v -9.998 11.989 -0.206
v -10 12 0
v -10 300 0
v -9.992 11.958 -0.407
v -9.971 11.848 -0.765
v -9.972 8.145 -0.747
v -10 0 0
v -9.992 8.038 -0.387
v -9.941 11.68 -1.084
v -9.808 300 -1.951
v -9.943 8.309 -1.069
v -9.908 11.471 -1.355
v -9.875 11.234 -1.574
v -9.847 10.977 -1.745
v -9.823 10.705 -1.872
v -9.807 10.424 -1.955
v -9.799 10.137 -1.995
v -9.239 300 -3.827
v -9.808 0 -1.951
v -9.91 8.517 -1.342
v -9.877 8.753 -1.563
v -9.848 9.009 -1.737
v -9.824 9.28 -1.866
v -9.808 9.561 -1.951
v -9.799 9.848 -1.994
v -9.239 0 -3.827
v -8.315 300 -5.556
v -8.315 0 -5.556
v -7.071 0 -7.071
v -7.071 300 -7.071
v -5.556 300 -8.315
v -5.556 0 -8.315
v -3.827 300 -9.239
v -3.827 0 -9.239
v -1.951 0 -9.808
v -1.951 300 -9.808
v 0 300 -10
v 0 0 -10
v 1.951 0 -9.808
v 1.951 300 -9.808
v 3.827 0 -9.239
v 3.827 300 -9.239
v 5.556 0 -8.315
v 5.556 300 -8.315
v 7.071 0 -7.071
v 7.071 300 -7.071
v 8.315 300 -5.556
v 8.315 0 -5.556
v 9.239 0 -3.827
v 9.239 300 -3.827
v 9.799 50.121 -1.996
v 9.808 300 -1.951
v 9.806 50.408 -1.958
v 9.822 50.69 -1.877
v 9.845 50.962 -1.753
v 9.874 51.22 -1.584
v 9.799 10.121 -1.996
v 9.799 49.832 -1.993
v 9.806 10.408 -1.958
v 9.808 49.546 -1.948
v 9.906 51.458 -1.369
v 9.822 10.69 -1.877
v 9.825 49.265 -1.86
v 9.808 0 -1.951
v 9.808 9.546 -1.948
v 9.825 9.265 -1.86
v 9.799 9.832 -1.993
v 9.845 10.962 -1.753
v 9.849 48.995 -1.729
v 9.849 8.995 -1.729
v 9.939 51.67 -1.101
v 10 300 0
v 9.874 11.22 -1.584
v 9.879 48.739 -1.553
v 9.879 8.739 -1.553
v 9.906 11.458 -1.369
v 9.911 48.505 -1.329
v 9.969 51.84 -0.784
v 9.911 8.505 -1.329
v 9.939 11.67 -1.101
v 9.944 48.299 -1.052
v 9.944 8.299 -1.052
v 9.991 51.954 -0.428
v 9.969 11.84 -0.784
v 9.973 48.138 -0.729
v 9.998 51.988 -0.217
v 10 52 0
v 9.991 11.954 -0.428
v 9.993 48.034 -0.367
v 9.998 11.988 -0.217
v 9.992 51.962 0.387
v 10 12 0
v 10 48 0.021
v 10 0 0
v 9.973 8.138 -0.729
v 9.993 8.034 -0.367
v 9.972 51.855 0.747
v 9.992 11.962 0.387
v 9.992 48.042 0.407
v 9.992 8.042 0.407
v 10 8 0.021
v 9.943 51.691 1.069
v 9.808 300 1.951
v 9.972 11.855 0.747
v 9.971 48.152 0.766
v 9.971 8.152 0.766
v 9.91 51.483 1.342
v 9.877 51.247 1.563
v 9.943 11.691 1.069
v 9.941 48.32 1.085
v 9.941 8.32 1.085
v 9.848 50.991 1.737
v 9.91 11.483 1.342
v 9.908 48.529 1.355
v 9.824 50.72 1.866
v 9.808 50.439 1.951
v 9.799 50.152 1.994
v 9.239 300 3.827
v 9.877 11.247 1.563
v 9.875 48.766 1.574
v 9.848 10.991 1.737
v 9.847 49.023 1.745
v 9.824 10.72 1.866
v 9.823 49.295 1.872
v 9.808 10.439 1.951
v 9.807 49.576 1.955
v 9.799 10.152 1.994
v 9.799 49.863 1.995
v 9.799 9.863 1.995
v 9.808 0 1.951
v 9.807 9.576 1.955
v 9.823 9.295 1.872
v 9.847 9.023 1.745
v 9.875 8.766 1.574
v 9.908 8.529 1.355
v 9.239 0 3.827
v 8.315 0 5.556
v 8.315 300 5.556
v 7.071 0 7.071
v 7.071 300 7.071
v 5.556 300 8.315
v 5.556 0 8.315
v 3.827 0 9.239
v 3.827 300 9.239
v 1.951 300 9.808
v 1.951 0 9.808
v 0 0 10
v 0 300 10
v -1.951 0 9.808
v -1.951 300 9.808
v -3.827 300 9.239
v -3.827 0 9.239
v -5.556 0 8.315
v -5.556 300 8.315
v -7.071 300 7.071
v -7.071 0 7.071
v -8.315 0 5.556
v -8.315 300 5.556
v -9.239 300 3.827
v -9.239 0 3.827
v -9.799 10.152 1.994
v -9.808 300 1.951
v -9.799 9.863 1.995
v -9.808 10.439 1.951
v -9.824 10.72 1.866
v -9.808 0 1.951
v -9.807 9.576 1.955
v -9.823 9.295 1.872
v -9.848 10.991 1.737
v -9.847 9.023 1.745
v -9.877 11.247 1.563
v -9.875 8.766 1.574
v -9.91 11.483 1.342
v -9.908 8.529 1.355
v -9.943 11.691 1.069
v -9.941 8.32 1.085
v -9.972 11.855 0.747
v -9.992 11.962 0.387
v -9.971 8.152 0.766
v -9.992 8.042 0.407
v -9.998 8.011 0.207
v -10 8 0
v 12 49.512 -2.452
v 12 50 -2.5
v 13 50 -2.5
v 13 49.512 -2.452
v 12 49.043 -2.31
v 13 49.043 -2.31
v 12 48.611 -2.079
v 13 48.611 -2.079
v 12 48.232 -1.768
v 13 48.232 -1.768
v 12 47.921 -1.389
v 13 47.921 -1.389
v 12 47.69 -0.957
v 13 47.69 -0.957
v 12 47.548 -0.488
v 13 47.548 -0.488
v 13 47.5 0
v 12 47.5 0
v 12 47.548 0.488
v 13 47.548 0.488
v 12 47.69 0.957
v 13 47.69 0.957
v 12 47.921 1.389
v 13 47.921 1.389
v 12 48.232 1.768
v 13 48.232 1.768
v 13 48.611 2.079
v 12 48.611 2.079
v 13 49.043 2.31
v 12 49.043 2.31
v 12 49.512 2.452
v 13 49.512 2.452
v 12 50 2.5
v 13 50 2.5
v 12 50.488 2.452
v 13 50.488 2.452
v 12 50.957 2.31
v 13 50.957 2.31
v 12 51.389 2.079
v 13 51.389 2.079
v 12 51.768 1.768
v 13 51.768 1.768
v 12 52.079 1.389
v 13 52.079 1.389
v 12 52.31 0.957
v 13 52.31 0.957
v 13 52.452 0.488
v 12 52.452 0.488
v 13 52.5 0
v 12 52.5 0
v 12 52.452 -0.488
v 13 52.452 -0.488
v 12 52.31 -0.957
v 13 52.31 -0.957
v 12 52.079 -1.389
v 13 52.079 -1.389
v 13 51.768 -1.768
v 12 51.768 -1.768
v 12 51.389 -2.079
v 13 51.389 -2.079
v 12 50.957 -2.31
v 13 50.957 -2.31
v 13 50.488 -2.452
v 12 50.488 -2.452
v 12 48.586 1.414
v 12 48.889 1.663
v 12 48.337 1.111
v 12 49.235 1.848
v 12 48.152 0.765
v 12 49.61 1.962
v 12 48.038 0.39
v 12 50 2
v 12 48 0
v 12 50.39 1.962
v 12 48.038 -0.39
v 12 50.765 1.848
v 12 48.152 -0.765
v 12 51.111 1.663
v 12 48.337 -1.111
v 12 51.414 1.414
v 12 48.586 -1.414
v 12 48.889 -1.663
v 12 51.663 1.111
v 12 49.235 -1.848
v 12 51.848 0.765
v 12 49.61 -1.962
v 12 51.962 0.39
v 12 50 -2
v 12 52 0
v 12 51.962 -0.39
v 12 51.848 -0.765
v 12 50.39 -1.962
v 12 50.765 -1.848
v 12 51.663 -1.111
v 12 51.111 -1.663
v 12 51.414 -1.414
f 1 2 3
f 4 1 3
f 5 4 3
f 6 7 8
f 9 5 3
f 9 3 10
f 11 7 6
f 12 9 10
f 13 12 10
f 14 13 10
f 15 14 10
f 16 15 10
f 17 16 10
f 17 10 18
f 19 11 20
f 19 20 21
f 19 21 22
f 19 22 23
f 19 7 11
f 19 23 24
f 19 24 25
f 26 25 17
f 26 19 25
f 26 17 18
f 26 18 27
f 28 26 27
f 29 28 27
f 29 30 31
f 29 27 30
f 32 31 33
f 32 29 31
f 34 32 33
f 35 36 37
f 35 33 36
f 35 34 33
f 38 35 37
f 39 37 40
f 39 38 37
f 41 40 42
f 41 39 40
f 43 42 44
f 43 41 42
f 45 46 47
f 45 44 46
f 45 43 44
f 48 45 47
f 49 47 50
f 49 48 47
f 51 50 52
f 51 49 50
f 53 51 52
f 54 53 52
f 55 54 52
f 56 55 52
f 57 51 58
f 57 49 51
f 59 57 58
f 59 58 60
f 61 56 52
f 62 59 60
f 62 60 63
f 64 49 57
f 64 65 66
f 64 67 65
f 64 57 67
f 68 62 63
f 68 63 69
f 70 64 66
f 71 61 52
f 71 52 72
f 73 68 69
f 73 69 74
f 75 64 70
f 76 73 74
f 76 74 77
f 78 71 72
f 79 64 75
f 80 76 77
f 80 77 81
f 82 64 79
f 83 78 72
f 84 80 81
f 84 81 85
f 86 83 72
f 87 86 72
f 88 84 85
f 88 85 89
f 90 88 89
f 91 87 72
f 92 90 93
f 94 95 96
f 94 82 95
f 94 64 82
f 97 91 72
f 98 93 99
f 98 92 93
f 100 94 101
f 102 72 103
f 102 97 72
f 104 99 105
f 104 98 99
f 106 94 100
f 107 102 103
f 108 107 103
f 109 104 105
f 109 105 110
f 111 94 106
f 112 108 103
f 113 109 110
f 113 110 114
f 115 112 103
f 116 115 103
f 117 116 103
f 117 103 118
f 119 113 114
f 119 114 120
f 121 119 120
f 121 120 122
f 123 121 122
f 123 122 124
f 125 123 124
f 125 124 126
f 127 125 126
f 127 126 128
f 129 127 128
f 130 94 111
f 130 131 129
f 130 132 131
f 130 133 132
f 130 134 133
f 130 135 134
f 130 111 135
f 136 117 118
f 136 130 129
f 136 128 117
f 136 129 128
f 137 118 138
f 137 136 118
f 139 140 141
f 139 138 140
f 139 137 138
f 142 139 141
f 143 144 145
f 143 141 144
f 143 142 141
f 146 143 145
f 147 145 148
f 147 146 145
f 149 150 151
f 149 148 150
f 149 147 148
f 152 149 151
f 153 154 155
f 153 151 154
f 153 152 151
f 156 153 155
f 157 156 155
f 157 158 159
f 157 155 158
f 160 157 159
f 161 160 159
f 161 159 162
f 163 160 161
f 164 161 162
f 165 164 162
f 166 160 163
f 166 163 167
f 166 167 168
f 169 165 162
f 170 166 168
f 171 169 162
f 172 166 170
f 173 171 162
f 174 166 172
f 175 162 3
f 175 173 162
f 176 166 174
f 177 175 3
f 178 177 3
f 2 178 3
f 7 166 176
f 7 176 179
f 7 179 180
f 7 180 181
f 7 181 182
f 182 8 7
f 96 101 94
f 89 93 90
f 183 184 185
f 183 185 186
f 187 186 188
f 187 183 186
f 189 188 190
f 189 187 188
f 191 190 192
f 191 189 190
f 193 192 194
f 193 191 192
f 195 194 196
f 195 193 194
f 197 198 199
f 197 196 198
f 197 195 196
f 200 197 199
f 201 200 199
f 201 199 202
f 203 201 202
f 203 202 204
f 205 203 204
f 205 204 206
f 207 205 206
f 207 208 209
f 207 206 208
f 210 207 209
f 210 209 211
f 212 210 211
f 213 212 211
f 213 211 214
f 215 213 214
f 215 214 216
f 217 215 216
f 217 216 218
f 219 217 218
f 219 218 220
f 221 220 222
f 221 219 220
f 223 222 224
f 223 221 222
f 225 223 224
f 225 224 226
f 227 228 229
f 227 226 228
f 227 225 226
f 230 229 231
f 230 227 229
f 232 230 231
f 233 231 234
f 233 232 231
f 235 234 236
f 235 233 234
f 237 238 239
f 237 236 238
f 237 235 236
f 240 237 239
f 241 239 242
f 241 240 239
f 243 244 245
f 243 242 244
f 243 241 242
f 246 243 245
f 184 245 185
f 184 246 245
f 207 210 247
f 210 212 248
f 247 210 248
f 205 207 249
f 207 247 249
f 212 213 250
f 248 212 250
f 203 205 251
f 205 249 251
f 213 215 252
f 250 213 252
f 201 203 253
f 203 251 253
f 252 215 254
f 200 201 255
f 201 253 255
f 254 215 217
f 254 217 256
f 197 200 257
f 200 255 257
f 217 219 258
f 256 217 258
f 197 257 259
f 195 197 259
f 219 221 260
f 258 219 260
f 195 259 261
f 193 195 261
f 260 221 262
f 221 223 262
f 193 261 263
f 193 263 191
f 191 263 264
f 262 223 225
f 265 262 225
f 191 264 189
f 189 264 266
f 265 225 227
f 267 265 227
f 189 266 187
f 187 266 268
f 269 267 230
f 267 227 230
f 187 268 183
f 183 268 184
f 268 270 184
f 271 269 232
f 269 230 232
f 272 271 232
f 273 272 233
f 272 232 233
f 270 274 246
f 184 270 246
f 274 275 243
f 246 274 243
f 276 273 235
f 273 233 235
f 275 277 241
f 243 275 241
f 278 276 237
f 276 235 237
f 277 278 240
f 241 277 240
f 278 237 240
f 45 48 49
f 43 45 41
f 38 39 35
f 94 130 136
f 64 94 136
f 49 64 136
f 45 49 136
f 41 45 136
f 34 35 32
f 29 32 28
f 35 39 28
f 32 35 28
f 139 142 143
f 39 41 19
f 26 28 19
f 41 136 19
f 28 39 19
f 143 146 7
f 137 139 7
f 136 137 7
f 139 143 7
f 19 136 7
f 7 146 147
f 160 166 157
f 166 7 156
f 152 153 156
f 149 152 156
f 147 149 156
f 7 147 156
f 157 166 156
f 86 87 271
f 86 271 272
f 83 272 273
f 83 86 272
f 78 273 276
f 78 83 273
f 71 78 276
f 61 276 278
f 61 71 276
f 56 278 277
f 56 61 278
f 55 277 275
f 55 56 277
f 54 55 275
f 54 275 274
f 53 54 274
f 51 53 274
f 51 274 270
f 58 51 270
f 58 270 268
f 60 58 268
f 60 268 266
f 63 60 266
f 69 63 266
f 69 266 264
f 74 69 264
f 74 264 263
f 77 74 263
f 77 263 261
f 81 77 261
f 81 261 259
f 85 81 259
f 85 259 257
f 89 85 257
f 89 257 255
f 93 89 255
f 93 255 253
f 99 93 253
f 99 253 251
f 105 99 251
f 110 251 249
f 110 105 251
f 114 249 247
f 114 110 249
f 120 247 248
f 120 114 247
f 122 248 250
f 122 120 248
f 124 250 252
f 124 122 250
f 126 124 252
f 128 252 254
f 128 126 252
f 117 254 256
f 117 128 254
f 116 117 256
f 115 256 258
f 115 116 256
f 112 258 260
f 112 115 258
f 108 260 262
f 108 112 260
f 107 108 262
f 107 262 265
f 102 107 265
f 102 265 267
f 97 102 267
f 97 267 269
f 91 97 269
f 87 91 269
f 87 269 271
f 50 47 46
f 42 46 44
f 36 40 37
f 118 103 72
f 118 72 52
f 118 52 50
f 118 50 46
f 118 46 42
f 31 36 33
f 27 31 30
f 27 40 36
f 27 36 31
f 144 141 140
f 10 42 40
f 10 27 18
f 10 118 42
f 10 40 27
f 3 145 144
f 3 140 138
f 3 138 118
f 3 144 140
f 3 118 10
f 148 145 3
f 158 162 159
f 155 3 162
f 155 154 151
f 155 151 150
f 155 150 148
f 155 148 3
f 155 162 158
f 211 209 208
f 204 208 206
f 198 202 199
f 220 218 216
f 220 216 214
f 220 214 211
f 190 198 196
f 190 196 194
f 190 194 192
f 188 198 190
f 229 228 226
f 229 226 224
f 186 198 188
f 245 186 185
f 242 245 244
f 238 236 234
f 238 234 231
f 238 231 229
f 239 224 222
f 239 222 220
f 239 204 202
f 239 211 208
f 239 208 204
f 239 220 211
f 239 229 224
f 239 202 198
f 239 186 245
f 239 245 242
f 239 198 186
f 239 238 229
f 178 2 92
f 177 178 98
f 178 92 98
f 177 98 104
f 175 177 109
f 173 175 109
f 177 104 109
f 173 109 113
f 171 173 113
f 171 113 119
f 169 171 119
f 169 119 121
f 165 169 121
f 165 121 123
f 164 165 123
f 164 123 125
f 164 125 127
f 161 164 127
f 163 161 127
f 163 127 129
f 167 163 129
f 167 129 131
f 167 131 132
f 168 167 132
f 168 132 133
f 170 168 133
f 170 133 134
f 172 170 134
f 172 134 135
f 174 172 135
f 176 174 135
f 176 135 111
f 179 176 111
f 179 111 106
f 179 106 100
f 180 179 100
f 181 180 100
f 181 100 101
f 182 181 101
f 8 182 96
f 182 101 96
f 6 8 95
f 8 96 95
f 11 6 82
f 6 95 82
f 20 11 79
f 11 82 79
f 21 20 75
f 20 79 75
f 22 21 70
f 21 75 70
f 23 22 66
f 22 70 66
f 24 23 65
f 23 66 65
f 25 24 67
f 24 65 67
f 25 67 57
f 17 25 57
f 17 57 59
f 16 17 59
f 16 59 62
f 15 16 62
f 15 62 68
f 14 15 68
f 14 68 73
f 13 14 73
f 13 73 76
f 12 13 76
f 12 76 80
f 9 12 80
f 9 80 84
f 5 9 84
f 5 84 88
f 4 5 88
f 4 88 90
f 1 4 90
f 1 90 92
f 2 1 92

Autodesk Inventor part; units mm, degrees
ref_plane "YZ Plane" through (0, 0, 0) normal (1, 0, 0) x (0, 1, 0)
ref_plane "XZ Plane" through (0, 0, 0) normal (0, 1, 0) x (-1, 0, 0)
ref_plane "XY Plane" through (0, 0, 0) normal (0, 0, 1) x (1, 0, 0)
sketch "Sketch1" plane through (0, 0, 0) normal (0, 1, 0) x (-1, 0, 0)
  circle A0 centre (0, 0) radius 10
  dimension "d0" = 20
extrude "Extrusion1" add sketch "Sketch1" along normal blind 300
sketch "Sketch2" plane through (0, 0, 0) normal (1, 0, 0) x (0, 1, 0)
  circle A0 centre (10, 0) radius 2
  circle A1 centre (50, 0) radius 2
  point P0 (0, 0)
  dimension "d3" = 4
  dimension "d4" = 4
extrude "Extrusion2" cut sketch "Sketch2" along normal mid plane 21 contours A0
sketch "Sketch3" plane through (0, 0, 0) normal (1, 0, 0) x (0, 1, 0)
  circle A0 centre (50, 0) radius 2
  point P0 (0, 0)
  dimension "d7" = 4
extrude "Extrusion3" add sketch "Sketch3" along normal blind 12
sketch "Sketch4" plane through (12, 50, 0) normal (1, 0, 0) x (0, 0, -1)
  circle A0 centre (0, 0) radius 2 projected
  circle A1 centre (0, 0) radius 2.5
  point P0 (0, -50)
  dimension "d10" = 5
extrude "Extrusion4" add sketch "Sketch4" along normal blind 1 contours A0 | A1
properties part number "trail 9"
